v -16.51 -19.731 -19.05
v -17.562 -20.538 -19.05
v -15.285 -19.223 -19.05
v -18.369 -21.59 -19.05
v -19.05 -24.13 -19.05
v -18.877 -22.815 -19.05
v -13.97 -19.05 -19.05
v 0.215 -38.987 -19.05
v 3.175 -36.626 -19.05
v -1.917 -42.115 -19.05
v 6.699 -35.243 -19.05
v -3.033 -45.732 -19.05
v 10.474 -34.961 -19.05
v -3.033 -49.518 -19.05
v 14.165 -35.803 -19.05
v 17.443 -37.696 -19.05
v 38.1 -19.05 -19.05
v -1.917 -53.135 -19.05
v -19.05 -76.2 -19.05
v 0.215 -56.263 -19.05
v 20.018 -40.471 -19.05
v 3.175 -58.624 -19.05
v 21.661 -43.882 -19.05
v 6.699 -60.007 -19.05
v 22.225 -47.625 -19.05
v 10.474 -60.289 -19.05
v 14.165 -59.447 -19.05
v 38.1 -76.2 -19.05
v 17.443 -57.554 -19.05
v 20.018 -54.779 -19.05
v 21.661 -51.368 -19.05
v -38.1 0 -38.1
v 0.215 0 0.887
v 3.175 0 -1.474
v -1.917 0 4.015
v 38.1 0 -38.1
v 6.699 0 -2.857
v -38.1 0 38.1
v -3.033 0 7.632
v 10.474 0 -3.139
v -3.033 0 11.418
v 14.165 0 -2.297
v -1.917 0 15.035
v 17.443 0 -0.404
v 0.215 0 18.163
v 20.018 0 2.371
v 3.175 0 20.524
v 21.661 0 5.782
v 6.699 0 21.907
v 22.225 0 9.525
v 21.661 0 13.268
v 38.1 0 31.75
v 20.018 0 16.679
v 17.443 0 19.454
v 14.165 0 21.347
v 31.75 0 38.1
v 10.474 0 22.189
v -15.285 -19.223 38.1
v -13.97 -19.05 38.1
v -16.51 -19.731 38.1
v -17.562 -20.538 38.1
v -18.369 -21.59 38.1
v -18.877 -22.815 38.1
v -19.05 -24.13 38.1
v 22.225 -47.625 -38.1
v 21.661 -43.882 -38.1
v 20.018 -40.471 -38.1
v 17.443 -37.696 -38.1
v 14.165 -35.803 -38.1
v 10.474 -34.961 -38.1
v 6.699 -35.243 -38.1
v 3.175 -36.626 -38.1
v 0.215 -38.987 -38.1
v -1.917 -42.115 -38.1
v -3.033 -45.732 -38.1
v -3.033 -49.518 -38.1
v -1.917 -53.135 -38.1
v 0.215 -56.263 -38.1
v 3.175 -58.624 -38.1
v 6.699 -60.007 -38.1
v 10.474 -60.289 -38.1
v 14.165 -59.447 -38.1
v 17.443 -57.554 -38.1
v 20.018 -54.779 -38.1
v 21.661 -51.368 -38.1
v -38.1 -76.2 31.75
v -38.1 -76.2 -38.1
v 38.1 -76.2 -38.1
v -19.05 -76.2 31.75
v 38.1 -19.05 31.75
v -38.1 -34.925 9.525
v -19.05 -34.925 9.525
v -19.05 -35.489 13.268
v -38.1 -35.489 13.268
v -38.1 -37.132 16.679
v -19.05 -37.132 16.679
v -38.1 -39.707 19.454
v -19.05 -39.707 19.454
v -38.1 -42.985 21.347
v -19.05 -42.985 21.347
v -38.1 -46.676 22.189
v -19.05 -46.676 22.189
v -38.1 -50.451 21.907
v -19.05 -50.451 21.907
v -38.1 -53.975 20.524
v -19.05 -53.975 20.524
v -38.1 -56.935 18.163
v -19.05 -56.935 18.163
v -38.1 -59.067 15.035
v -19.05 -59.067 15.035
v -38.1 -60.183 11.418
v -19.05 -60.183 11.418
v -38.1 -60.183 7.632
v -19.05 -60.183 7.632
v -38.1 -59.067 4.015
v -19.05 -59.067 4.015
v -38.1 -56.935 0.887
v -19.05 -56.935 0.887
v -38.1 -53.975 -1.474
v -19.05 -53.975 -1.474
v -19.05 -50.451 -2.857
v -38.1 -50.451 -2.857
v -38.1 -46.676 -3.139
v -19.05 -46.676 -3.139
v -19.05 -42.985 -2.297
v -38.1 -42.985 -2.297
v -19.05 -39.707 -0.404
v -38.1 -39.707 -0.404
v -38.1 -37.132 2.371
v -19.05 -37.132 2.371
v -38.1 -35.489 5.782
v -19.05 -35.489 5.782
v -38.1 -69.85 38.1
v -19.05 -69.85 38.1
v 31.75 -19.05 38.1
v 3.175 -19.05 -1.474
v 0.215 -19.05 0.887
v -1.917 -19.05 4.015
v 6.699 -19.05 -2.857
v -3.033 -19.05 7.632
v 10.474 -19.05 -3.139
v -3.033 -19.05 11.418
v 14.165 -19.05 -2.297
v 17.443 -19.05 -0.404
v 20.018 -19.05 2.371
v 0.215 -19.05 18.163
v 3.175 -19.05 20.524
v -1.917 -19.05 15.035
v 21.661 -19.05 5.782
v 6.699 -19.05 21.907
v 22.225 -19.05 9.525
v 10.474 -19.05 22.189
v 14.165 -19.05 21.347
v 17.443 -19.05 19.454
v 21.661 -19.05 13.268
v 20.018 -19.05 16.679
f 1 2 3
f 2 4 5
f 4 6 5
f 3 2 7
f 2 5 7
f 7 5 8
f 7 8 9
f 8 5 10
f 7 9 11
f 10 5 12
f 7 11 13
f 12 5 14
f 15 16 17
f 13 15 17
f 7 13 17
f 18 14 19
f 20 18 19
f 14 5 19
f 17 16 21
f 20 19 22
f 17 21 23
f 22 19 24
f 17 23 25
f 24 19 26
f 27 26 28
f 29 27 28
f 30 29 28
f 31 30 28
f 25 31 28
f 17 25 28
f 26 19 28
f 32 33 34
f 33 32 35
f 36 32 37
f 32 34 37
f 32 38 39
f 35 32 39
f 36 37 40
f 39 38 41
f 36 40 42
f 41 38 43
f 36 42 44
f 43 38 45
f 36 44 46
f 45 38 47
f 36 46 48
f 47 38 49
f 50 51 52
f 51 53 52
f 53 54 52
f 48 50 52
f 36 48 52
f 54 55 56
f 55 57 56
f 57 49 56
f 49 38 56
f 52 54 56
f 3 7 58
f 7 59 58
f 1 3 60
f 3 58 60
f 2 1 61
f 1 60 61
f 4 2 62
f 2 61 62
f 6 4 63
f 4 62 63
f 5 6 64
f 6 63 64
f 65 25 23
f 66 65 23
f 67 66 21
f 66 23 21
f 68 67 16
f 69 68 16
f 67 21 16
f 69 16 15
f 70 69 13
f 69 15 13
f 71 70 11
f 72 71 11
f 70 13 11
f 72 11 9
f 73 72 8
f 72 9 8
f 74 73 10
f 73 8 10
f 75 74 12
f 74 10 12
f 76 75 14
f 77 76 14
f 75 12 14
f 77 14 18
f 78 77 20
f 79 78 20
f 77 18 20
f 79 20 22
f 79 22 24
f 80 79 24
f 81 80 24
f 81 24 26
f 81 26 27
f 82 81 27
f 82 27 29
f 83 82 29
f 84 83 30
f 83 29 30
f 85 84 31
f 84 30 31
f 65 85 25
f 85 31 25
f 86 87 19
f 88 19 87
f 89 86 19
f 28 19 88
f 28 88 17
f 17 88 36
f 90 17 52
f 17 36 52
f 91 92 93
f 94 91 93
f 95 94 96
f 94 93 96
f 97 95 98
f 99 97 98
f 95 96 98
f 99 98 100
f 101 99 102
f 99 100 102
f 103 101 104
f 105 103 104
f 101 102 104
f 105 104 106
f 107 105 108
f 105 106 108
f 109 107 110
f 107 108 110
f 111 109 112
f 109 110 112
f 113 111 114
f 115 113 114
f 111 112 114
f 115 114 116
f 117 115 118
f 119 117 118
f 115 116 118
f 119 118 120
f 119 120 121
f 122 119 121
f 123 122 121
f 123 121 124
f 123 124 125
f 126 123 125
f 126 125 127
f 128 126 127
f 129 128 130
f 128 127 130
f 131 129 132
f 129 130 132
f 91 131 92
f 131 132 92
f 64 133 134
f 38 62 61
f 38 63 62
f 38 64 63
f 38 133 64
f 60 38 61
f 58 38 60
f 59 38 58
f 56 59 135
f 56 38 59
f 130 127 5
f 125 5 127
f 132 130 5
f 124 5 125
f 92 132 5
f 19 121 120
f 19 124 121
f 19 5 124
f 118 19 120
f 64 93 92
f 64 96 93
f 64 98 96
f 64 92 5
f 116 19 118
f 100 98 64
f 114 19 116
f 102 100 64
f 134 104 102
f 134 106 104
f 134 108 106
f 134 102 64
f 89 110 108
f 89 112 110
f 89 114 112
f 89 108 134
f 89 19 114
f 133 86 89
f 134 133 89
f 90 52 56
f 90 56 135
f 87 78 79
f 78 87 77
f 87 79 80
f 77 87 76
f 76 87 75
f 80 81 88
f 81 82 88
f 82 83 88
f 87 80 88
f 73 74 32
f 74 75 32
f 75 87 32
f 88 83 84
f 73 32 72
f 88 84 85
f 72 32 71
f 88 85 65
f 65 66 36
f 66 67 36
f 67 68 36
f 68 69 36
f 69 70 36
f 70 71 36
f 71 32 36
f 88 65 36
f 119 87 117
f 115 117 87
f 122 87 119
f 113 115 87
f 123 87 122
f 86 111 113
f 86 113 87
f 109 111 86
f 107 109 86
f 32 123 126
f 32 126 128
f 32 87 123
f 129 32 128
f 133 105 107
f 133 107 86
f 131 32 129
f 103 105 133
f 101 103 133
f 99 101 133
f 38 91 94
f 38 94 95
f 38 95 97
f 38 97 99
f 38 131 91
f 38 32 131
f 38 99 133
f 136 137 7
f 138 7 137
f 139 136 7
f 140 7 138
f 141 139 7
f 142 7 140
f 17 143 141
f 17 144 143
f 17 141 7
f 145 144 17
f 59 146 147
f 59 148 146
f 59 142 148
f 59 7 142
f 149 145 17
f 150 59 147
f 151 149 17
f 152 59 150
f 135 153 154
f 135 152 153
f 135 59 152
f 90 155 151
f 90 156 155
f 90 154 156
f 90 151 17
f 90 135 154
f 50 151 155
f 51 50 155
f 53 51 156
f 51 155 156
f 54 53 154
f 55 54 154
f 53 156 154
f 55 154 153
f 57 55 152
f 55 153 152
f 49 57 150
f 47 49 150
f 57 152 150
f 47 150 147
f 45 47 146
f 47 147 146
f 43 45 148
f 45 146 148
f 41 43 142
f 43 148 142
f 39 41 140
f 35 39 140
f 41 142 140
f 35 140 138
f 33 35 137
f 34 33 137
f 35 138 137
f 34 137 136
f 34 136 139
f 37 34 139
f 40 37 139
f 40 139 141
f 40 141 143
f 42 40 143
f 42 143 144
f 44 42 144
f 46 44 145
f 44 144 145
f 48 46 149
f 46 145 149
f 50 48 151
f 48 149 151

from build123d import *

# Parameters (mm, degrees)
F0_W      = 76.2
F0_H      = 76.2
F1_DEPTH  = 76.2
F2_W      = 57.15
F2_H      = 57.15
F3_DEPTH  = 57.15
F4_SIZE   = 6.35
F5_SIZE   = 6.35
F6_R      = 5.08
F7_R      = 12.7
F8_DEPTH  = 19.05
F9_R      = 12.7
F10_DEPTH = 19.05
F11_R     = 12.7
F12_DEPTH = 19.05


with BuildPart() as f1:
    # F0 (on Front) → F1 (new body)
    with BuildSketch(Plane.XZ):
        Rectangle(F0_W, F0_H)
    extrude(amount=F1_DEPTH)

    # F2 (on face) → F3 (cut)
    with BuildSketch(Plane.XZ.offset(76.2)):
        with Locations((9.525, 9.525)):
            Rectangle(F2_W, F2_H)
    extrude(amount=-F3_DEPTH, mode=Mode.SUBTRACT)

    # F4
    f4_edges = [f1.edges().sort_by_distance(p)[0] for p in [
        (-28.575, -76.2, 38.1),
    ]]
    chamfer(f4_edges, length=F4_SIZE)

    # F5
    f5_edges = [f1.edges().sort_by_distance(p)[0] for p in [
        (38.1, -9.525, 38.1),
    ]]
    chamfer(f5_edges, length=F5_SIZE)

    # F6
    f6_edges = [f1.edges().sort_by_distance(p)[0] for p in [
        (-19.05, -19.05, 9.525),
    ]]
    fillet(f6_edges, radius=F6_R)

    # F7 (on face) → F8 (cut)
    with BuildSketch(Plane.YZ.offset(-19.05)):
        with Locations((-47.625, 9.525)):
            Circle(F7_R)
    extrude(amount=-F8_DEPTH, mode=Mode.SUBTRACT)

    # F9 (on face) → F10 (cut)
    with BuildSketch(Plane.XZ.offset(19.05)):
        with Locations((9.525, 9.525)):
            Circle(F9_R)
    extrude(amount=-F10_DEPTH, mode=Mode.SUBTRACT)

    # F11 (on face) → F12 (cut)
    with BuildSketch(Plane.XY.offset(-19.05)):
        with Locations((9.525, -47.625)):
            Circle(F11_R)
    extrude(amount=-F12_DEPTH, mode=Mode.SUBTRACT)


solid = f1.part
